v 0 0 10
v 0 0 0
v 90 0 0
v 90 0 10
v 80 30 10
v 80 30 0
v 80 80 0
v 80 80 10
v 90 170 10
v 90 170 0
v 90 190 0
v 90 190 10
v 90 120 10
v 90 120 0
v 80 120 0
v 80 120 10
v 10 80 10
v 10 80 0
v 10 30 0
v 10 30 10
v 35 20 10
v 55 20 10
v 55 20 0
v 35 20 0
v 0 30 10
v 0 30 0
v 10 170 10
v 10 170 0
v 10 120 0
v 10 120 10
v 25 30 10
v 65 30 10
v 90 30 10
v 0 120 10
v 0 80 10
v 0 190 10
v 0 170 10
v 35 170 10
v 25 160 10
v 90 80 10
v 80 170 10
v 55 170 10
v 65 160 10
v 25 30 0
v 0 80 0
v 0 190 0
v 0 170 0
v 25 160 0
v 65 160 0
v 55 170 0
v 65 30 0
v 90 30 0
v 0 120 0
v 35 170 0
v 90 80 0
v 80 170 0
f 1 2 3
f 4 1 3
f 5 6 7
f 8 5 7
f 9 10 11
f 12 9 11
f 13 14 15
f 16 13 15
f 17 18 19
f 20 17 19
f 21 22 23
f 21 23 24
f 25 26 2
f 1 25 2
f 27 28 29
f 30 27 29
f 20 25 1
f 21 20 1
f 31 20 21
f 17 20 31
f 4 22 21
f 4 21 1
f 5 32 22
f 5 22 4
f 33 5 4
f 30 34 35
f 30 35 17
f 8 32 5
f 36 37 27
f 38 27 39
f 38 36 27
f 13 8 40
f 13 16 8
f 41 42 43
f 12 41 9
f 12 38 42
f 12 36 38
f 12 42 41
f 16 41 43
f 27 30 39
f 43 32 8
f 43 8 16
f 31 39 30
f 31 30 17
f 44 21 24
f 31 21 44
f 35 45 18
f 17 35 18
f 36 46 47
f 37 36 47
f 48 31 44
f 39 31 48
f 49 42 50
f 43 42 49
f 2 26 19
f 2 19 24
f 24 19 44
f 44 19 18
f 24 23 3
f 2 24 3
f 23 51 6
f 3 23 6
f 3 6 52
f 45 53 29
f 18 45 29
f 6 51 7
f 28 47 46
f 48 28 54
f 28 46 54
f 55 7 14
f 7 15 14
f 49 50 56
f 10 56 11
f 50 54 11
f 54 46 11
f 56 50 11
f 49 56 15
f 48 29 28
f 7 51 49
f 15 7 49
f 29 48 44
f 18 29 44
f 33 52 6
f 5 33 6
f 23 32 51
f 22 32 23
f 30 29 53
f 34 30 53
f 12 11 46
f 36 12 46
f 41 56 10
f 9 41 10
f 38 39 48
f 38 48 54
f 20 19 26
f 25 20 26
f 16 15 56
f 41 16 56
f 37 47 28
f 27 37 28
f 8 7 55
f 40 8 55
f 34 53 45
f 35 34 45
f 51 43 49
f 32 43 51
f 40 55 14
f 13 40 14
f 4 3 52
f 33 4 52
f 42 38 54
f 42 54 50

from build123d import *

# Parameters (mm, degrees)
BOSS_EXTRU_1_DEPTH      = 10
ENL_V_MAT_EXTRU_1_DEPTH = 10


with BuildPart() as part:
    # Esquisse1 → Boss.-Extru.1 (new body)
    with BuildSketch(Plane.XY):
        Polygon((0, 0), (90, 0), (90, 30), (80, 30), (80, 80), (90, 80), (90, 120), (80, 120), (80, 170), (90, 170), (90, 190), (0, 190), (0, 170), (10, 170), (10, 120), (0, 120), (0, 80), (10, 80), (10, 30), (0, 30), align=None)
    extrude(amount=BOSS_EXTRU_1_DEPTH)

    # Esquisse2 → Enlèv. mat.-Extru.1 (cut)
    with BuildSketch(Plane.XY.offset(10)):
        Polygon((35, 170), (55, 170), (65, 160), (65, 30), (55, 20), (35, 20), (25, 30), (25, 160), align=None)
    extrude(amount=-ENL_V_MAT_EXTRU_1_DEPTH, mode=Mode.SUBTRACT)


solid = part.part
